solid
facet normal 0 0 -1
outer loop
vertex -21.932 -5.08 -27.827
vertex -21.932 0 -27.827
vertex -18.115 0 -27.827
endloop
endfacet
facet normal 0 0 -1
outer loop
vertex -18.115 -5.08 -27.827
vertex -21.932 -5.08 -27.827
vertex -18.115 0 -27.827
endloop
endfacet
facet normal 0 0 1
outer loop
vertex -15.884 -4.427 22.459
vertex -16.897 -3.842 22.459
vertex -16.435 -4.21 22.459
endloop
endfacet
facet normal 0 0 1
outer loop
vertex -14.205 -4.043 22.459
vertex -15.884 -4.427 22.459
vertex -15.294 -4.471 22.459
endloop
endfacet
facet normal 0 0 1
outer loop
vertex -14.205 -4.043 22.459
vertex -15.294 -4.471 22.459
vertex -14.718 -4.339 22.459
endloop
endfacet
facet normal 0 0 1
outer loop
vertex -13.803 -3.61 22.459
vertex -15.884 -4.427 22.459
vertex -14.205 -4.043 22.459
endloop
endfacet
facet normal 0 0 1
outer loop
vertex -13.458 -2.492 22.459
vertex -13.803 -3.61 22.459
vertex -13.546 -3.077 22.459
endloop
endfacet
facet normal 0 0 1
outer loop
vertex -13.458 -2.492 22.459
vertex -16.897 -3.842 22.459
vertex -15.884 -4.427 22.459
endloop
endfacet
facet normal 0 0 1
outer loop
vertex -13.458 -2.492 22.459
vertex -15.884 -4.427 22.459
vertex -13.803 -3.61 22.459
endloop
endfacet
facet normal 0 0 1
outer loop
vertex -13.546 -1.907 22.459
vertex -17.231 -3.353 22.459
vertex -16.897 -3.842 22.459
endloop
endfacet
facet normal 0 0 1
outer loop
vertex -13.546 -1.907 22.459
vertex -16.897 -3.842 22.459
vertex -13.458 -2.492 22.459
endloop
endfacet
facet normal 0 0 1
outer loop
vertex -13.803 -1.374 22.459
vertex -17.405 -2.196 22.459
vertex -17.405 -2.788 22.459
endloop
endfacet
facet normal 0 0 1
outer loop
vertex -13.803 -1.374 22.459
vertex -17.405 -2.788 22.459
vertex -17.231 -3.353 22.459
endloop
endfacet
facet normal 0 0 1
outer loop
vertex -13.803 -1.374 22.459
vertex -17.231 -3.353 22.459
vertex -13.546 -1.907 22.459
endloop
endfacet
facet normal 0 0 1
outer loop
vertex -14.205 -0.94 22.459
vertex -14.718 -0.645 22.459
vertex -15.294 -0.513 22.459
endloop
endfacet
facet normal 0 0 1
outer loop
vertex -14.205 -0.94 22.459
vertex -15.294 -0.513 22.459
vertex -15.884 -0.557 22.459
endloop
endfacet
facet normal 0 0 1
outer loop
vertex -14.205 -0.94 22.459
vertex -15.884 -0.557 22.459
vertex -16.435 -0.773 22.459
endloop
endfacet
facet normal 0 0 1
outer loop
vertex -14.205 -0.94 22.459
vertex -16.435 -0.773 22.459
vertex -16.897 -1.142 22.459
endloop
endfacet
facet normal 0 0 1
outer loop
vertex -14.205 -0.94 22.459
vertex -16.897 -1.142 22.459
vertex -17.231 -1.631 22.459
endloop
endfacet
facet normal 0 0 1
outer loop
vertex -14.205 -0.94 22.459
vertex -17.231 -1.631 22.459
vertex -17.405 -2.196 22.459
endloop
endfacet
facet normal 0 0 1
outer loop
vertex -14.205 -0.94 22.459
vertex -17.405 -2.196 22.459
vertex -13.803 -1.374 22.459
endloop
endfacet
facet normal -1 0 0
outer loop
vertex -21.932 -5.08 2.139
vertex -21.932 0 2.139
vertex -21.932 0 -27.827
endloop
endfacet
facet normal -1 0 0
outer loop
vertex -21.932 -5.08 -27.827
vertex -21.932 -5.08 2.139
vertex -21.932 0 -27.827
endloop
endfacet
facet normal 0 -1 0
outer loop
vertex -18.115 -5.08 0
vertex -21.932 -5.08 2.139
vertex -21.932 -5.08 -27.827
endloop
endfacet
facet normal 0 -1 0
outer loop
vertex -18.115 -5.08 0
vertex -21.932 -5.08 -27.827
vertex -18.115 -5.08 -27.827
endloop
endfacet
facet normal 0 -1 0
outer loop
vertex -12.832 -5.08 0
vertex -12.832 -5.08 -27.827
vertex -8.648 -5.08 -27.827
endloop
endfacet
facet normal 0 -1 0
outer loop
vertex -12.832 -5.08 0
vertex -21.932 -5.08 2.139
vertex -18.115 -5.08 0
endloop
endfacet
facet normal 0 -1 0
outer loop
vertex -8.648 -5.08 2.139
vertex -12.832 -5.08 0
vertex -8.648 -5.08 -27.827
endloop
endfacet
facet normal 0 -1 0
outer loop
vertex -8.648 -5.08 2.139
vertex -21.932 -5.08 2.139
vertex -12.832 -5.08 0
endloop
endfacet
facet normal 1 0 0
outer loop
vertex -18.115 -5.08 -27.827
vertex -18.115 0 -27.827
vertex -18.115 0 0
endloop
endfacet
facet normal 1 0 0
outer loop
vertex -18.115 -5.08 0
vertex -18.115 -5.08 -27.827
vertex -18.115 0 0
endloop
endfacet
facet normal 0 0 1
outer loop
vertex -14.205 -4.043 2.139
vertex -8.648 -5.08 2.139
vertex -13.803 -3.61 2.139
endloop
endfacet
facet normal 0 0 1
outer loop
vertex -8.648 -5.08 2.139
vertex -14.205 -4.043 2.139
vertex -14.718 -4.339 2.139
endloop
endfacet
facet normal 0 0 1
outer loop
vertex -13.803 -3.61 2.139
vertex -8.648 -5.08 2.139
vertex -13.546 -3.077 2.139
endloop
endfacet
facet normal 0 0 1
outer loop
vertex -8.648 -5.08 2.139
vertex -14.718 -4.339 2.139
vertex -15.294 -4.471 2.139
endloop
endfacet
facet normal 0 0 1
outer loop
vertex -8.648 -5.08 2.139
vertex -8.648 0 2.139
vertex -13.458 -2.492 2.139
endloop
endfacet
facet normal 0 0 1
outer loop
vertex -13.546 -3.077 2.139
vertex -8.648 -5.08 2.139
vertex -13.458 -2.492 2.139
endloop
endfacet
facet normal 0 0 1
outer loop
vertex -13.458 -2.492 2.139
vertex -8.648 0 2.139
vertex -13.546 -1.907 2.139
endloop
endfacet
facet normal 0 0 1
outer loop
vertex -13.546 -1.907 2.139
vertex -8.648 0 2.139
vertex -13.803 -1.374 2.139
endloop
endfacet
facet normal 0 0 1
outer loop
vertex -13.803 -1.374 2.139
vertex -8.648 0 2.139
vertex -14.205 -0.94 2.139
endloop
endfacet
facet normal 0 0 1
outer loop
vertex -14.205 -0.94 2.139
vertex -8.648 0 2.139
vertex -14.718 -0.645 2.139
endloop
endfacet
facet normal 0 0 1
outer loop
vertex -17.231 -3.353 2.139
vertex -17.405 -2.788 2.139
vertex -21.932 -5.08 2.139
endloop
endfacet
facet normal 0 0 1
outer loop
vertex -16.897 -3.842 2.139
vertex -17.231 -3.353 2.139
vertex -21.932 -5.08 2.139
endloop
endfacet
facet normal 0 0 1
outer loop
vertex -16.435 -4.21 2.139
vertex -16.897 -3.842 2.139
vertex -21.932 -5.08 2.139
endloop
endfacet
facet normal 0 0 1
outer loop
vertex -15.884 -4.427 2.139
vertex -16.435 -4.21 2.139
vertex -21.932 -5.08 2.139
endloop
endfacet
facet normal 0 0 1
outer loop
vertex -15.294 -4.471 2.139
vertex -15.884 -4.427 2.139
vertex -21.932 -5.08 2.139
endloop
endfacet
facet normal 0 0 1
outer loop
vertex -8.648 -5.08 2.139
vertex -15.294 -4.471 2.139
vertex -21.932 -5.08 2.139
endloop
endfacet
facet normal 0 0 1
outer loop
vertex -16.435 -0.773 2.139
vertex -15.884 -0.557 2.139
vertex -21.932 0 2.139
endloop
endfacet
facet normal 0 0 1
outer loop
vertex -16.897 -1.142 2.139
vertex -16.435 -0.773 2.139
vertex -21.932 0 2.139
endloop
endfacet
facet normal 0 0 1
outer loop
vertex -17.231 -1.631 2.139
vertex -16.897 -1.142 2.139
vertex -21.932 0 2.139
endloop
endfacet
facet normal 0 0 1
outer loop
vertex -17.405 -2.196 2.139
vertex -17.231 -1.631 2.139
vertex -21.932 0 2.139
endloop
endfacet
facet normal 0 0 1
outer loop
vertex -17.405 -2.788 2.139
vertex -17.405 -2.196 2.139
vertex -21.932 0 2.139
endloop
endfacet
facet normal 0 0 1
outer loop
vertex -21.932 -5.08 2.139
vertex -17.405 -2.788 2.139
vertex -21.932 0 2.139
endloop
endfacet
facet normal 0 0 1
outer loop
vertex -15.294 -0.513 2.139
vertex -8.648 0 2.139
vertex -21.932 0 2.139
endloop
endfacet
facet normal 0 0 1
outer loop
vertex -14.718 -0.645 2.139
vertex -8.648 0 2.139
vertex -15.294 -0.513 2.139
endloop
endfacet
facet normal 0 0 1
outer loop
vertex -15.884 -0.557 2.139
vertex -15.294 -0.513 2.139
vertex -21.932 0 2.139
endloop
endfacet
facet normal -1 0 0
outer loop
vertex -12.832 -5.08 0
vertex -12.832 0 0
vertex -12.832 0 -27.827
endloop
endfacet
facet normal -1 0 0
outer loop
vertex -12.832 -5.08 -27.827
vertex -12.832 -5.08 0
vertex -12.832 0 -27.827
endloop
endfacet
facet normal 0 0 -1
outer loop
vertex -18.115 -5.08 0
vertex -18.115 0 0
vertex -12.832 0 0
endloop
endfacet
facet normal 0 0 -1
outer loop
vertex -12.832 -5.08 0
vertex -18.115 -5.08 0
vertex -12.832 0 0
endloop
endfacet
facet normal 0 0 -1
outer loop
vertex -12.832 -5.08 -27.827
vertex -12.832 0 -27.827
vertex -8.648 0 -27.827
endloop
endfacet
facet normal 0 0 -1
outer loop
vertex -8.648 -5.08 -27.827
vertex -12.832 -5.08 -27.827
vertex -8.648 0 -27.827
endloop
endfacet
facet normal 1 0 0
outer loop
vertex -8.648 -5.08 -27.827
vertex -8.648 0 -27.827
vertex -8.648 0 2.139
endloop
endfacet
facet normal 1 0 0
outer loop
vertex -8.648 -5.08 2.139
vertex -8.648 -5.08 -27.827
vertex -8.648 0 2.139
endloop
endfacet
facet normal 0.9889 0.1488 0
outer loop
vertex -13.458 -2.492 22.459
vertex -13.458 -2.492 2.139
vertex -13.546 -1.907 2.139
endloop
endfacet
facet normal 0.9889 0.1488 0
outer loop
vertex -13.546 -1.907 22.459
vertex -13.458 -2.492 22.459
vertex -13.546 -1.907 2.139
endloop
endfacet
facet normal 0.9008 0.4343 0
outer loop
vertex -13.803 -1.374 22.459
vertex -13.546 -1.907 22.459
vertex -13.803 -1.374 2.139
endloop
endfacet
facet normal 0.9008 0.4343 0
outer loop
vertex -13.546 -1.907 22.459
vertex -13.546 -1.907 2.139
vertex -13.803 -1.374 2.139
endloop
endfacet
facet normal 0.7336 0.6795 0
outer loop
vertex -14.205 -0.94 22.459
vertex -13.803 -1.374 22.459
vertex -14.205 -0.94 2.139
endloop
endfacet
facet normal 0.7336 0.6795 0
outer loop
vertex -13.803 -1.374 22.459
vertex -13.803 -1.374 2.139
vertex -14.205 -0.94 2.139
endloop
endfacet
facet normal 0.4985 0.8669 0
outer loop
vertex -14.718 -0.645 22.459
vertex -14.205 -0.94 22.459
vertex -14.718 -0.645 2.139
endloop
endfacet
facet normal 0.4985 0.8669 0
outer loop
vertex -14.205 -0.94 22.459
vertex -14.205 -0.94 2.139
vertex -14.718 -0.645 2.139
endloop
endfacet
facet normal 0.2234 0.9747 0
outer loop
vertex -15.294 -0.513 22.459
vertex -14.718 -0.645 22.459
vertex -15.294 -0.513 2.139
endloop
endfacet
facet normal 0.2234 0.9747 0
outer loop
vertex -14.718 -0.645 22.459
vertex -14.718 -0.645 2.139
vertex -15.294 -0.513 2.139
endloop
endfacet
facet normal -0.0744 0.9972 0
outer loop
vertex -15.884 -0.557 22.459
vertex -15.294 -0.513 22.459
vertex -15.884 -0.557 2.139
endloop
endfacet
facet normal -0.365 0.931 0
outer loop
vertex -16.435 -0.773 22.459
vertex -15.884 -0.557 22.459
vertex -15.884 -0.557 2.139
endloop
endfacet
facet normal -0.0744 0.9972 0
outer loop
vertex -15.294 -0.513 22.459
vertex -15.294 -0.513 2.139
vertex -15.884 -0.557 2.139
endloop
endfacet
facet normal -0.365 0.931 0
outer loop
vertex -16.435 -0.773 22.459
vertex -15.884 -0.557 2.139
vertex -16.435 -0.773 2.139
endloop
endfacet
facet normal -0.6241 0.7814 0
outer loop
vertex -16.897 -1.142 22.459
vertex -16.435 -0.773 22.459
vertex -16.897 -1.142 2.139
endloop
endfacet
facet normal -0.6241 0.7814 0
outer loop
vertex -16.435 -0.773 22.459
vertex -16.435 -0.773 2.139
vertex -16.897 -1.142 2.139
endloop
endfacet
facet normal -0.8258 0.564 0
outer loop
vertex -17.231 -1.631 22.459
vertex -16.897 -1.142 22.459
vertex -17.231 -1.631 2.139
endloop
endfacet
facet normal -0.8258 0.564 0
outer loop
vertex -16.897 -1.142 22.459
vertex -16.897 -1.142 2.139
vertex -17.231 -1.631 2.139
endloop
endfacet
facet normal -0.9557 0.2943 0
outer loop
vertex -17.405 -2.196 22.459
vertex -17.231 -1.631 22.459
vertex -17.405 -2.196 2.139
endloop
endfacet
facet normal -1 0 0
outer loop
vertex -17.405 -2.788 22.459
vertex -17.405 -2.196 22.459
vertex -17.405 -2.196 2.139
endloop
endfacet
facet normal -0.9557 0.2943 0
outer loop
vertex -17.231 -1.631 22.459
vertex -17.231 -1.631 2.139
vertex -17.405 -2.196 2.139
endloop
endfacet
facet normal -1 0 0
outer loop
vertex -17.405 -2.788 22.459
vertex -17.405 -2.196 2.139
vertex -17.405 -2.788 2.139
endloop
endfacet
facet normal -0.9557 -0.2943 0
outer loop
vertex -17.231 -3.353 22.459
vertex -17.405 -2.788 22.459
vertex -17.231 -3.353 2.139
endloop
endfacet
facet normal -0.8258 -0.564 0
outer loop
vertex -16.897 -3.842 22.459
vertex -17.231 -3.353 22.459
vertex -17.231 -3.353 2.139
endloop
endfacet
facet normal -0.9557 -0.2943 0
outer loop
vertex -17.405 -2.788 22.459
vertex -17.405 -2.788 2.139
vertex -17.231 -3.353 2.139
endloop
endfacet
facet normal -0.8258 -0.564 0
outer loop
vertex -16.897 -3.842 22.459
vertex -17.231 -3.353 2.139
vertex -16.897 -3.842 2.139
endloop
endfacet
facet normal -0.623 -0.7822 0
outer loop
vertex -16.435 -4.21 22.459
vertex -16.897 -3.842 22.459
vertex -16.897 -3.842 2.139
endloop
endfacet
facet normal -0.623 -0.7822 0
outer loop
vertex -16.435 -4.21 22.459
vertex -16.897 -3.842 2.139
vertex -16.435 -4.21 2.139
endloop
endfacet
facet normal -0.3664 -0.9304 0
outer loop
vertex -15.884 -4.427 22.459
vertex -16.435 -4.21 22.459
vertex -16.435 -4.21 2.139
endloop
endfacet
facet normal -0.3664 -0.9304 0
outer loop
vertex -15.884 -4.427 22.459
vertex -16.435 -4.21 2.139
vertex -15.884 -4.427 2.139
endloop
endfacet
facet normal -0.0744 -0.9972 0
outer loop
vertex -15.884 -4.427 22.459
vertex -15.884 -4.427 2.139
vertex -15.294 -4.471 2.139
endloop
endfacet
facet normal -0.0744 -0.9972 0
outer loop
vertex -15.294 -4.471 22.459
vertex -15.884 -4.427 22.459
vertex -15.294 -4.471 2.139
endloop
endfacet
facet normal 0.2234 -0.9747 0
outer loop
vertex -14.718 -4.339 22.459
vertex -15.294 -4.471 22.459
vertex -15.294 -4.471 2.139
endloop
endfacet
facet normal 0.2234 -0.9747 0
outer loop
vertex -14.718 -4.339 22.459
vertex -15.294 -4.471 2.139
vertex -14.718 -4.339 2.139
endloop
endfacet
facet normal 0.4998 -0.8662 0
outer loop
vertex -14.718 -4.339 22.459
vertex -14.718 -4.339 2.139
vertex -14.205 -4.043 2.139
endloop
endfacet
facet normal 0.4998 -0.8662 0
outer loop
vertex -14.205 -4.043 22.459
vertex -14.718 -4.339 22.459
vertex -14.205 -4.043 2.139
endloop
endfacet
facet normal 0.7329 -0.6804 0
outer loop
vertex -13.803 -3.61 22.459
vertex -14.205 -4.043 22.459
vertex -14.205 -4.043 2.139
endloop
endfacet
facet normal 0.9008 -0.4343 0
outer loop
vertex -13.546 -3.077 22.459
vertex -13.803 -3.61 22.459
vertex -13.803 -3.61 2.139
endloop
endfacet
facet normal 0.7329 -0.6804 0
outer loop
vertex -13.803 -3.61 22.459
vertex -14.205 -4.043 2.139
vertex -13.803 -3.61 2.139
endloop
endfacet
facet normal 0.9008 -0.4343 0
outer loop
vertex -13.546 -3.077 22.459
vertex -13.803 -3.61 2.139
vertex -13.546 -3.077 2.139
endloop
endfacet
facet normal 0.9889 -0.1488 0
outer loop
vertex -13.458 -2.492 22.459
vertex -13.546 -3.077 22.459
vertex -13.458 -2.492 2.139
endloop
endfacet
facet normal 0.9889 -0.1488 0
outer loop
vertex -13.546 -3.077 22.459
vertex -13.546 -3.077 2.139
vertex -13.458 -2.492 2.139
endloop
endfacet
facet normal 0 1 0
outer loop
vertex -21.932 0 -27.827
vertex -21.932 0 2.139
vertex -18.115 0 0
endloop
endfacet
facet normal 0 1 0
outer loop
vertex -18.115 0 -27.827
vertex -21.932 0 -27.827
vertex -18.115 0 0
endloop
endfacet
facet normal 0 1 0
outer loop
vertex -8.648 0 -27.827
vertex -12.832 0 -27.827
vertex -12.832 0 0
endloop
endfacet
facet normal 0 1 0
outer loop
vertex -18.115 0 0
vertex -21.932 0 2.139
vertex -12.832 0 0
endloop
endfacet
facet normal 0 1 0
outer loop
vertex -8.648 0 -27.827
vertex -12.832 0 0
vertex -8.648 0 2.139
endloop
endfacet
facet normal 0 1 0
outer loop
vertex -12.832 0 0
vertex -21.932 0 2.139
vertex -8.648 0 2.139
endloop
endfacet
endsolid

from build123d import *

# Parameters (mm, degrees)
F0_W     = 5.2836788818
F0_H     = 2.1386321168
F1_DEPTH = 5.08
F2_R     = 1.9844931554
F3_DEPTH = 20.32


with BuildPart() as f1:
    # F0 (on Front) → F1 (new body)
    with BuildSketch(Plane.XZ):
        with Locations((-15.4736326076, 1.0693160584)):
            Rectangle(F0_W, F0_H)
        Polygon((-12.8317931667, 2.1386321168), (-12.8317931667, 0), (-12.8317931667, -27.8271362185), (-8.6476681754, -27.8271362185), (-8.6476681754, 2.1386321168), align=None)
        Polygon((-18.1154720485, -27.8271362185), (-18.1154720485, 0), (-18.1154720485, 2.1386321168), (-21.9318177551, 2.1386321168), (-21.9318177551, -27.8271362185), align=None)
    extrude(amount=F1_DEPTH)

    # F2 (on face) → F3 (join)
    with BuildSketch(Plane.XY.offset(2.1386321168)):
        with Locations((-15.4426656663, -2.4918615818)):
            Circle(F2_R)
    extrude(amount=F3_DEPTH)


solid = f1.part
